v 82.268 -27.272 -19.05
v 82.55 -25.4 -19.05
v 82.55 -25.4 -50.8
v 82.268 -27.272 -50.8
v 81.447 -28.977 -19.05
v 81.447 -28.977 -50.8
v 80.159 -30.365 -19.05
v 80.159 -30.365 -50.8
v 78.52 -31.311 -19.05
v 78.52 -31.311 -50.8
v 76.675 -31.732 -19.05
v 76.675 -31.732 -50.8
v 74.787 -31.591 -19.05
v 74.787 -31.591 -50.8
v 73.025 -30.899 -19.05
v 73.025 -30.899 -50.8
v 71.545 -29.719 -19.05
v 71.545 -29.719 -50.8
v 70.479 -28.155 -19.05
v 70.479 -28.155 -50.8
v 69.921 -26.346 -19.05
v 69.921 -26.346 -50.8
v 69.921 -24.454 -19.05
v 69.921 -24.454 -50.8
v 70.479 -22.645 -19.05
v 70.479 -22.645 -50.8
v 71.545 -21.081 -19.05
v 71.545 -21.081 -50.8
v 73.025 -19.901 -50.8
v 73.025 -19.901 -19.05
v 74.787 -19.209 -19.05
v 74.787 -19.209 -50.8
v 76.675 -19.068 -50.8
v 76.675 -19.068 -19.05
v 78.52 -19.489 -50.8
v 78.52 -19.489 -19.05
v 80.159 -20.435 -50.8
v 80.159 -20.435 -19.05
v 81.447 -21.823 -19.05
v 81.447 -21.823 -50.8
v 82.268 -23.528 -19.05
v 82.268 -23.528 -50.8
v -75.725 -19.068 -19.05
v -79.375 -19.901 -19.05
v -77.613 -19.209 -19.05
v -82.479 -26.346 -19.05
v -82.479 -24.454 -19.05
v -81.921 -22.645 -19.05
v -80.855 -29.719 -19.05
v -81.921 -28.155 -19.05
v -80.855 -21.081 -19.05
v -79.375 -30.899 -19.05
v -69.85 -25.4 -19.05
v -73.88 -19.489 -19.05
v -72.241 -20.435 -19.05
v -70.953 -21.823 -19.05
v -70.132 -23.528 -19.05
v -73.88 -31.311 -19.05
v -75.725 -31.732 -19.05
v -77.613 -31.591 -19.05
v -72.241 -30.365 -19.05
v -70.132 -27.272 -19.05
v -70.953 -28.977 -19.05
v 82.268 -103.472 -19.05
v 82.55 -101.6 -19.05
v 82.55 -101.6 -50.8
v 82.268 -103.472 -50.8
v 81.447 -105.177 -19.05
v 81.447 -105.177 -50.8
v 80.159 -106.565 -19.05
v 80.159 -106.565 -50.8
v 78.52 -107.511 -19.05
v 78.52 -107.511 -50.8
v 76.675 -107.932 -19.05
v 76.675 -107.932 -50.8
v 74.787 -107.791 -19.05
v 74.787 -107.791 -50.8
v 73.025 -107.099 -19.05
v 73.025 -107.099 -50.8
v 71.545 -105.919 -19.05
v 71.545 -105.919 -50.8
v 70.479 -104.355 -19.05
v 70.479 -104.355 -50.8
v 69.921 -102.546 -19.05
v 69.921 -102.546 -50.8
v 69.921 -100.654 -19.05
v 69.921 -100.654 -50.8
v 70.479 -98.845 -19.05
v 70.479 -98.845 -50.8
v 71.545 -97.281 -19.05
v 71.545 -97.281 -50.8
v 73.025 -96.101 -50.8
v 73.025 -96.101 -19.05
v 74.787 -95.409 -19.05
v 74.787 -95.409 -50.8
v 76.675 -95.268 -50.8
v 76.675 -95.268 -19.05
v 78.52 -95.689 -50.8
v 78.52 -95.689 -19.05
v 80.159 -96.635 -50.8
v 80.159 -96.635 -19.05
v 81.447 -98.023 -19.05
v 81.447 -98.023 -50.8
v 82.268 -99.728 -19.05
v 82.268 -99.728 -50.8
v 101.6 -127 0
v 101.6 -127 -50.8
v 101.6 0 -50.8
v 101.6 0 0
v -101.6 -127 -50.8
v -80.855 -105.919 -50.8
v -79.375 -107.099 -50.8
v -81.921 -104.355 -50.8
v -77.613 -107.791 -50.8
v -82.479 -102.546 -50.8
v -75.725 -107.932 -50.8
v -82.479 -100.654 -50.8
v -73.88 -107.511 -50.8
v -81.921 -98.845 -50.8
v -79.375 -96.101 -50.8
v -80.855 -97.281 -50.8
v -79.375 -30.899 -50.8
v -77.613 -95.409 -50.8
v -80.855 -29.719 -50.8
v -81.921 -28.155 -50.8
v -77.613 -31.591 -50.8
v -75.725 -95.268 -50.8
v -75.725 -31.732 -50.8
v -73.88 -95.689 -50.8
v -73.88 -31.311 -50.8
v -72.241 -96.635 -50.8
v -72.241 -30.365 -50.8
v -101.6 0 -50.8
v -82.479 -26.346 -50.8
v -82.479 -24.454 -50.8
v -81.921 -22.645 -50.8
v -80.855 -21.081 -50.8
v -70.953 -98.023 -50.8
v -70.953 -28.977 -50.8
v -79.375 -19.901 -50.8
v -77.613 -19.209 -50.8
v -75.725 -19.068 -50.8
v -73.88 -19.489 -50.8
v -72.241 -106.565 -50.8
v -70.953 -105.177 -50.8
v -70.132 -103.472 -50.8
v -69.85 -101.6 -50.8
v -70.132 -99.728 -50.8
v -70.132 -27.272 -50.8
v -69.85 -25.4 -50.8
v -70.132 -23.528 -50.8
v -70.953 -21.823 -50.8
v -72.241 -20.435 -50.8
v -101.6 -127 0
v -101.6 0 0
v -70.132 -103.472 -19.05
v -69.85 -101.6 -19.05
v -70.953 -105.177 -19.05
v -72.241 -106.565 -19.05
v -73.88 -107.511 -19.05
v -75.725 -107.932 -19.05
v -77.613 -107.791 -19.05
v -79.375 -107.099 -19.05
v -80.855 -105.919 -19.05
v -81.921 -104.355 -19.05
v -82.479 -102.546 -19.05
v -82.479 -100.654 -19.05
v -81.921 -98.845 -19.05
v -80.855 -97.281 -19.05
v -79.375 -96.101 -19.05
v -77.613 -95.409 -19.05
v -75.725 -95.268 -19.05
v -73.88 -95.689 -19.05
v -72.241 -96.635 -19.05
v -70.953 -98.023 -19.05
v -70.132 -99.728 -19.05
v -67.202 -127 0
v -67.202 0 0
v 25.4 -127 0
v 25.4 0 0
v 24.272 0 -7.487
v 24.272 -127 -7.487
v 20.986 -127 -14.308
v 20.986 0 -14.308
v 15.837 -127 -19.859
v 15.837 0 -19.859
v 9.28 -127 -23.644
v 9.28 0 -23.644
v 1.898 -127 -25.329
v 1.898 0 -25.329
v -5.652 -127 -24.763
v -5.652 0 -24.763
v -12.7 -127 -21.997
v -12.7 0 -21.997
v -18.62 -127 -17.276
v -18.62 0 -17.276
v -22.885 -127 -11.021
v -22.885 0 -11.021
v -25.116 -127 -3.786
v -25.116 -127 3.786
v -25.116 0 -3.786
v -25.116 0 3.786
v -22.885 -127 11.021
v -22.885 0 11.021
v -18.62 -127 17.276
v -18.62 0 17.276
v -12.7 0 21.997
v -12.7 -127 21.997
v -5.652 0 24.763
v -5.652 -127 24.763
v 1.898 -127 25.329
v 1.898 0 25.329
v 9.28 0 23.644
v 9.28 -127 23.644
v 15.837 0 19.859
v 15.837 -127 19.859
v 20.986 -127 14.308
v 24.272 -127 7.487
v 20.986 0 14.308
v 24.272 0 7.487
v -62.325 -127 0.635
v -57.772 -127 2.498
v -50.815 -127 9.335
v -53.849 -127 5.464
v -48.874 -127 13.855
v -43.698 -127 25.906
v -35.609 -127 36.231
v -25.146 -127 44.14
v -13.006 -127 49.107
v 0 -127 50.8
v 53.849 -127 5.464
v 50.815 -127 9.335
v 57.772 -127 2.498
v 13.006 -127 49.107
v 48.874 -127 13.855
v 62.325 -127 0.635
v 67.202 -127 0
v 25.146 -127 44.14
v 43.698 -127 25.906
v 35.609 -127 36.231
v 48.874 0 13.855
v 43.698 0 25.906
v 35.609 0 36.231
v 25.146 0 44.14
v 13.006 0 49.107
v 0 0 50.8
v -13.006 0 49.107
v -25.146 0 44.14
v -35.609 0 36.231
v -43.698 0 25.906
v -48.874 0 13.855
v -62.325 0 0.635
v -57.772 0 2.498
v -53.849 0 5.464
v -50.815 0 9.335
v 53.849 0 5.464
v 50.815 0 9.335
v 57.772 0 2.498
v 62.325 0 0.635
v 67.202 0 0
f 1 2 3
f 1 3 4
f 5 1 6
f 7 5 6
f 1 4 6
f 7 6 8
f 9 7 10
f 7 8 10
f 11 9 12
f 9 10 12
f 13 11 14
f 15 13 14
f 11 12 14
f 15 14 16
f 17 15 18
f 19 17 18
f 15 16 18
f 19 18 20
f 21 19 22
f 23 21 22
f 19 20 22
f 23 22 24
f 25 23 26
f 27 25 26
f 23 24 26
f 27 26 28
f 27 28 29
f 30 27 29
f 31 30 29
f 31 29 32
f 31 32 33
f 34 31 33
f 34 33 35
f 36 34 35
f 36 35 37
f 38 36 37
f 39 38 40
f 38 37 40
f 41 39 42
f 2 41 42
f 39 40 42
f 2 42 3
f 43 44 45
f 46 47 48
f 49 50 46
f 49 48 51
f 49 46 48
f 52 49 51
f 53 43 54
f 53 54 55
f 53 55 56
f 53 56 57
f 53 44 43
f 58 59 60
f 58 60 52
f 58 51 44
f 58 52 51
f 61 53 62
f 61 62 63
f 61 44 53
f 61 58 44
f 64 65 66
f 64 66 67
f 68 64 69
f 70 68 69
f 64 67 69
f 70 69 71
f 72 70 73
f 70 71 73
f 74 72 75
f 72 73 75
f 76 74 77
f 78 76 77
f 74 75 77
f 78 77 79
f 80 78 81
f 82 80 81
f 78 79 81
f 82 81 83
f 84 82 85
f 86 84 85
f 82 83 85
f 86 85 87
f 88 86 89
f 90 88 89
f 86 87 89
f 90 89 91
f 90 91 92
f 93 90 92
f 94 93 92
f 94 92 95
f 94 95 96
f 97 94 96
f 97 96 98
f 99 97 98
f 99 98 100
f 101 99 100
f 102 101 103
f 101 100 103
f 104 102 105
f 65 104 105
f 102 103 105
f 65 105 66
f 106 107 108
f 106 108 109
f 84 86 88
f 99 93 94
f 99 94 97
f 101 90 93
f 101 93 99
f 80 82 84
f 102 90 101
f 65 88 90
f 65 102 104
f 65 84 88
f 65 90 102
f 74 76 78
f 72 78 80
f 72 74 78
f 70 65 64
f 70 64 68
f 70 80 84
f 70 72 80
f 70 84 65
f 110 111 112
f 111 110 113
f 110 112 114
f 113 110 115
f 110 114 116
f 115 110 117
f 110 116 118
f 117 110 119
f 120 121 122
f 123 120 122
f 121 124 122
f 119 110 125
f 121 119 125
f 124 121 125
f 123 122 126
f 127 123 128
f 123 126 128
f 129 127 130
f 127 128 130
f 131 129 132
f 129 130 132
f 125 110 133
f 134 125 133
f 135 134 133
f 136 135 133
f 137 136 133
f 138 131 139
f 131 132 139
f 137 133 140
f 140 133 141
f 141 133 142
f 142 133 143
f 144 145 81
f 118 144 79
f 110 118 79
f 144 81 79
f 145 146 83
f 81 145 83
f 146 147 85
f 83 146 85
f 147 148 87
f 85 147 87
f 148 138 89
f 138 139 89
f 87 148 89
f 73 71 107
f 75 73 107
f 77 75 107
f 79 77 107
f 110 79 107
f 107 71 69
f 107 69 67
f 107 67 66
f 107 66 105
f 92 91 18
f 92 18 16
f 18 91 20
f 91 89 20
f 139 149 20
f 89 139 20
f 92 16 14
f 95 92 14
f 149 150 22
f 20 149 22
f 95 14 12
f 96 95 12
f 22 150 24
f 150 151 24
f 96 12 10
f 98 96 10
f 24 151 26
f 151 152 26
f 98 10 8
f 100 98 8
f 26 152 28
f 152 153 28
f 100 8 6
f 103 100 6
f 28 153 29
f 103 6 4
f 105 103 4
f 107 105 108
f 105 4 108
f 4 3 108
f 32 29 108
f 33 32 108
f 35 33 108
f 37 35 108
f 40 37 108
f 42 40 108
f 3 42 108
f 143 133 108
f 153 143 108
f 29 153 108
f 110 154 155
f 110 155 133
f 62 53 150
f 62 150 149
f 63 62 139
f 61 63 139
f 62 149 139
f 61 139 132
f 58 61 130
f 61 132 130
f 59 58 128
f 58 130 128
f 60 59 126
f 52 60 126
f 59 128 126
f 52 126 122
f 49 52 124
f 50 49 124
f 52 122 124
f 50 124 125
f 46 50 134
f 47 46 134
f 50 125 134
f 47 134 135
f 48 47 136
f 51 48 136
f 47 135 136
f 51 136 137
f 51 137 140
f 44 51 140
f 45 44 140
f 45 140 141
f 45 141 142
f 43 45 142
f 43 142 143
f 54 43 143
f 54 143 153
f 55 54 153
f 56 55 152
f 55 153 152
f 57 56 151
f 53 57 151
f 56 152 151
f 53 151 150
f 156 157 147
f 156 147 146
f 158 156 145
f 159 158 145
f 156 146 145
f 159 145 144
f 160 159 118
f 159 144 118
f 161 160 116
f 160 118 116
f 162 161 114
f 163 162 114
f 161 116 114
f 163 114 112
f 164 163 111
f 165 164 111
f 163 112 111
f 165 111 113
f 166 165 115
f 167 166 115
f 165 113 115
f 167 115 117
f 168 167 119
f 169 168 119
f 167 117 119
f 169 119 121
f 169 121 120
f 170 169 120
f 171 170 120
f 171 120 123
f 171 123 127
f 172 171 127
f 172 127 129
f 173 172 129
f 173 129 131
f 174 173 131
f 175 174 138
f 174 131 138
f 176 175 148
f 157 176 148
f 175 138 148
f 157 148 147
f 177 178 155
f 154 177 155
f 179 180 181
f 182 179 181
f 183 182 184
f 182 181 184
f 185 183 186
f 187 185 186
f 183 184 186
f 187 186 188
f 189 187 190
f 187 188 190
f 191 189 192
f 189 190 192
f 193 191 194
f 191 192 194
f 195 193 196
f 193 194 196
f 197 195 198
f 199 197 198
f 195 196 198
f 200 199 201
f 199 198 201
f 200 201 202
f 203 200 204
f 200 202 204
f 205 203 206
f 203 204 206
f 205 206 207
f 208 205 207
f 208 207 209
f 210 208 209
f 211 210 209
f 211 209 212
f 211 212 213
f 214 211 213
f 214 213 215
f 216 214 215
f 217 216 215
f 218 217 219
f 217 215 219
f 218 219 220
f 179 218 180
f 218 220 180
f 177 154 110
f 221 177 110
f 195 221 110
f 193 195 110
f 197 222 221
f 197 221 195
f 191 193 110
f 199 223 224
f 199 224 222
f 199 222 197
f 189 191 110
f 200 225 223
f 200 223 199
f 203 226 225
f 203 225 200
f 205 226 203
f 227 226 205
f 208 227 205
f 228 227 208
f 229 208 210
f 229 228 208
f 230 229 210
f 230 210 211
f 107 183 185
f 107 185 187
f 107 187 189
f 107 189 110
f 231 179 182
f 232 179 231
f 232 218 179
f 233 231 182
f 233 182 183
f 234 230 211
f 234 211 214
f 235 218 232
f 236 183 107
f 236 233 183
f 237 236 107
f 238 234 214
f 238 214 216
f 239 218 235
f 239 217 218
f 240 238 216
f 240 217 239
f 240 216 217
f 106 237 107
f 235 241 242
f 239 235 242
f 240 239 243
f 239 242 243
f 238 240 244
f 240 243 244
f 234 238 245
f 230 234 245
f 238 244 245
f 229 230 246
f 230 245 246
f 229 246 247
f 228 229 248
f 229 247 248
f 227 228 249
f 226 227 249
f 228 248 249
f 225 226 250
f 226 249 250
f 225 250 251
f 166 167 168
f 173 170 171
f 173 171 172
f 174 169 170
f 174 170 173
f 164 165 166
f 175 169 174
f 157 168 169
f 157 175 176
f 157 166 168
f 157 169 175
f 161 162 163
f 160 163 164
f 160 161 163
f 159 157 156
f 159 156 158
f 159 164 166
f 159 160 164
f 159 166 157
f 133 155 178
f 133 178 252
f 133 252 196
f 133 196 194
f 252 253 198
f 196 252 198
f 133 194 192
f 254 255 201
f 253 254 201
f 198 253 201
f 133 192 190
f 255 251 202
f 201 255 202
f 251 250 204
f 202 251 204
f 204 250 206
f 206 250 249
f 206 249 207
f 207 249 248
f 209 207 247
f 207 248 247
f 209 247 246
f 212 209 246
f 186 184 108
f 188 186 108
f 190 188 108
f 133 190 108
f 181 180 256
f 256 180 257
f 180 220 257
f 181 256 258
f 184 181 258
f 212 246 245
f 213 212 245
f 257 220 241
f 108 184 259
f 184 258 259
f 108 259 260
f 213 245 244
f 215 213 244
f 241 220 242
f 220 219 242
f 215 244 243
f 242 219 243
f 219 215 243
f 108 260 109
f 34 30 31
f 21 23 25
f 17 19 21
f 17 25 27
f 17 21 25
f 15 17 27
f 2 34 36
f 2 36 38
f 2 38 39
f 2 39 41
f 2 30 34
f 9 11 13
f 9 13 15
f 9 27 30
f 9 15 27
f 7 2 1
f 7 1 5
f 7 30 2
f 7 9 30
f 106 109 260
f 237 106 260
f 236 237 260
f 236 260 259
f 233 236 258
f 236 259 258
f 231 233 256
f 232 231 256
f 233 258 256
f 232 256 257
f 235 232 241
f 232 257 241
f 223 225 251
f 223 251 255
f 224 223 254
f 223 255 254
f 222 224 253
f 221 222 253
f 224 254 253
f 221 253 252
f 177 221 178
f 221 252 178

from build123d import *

# Parameters (mm, degrees)
F1_DEPTH = 127
F2_R     = 6.35
F3_DEPTH = 31.75


with BuildPart() as f1:
    # F0 (on Front) → F1 (new body)
    with BuildSketch(Plane.XZ):
        with BuildLine():
            ThreePointArc((67.202083, 0), (55.714501, 3.853357), (48.874242, 13.854545))
            ThreePointArc((48.874242, 13.854545), (0, 50.8), (-48.874242, 13.854545))
            ThreePointArc((-48.874242, 13.854545), (-55.714501, 3.853357), (-67.202083, 0))
            Line((-67.202083, 0), (-101.6, 0))
            Line((-101.6, 0), (-101.6, -50.8))
            Line((-101.6, -50.8), (101.6, -50.8))
            Line((101.6, -50.8), (101.6, 0))
            Line((101.6, 0), (67.202083, 0))
        make_face()
        with BuildLine():
            ThreePointArc((-25.4, 0), (0, 25.4), (25.4, 0))
            ThreePointArc((25.4, 0), (0, -25.4), (-25.4, 0))
        make_face(mode=Mode.SUBTRACT)
    extrude(amount=F1_DEPTH)

    # F2 (on face) → F3 (cut)
    with BuildSketch(Plane(origin=(0, 0, -50.8), x_dir=(1, 0, 0), z_dir=(0, 0, -1))):
        with Locations((-76.2, 101.6)):
            Circle(F2_R)
        with Locations((-76.2, 25.4)):
            Circle(F2_R)
        with Locations((76.2, 25.4)):
            Circle(F2_R)
        with Locations((76.2, 101.6)):
            Circle(F2_R)
    extrude(amount=-F3_DEPTH, mode=Mode.SUBTRACT)


solid = f1.part
